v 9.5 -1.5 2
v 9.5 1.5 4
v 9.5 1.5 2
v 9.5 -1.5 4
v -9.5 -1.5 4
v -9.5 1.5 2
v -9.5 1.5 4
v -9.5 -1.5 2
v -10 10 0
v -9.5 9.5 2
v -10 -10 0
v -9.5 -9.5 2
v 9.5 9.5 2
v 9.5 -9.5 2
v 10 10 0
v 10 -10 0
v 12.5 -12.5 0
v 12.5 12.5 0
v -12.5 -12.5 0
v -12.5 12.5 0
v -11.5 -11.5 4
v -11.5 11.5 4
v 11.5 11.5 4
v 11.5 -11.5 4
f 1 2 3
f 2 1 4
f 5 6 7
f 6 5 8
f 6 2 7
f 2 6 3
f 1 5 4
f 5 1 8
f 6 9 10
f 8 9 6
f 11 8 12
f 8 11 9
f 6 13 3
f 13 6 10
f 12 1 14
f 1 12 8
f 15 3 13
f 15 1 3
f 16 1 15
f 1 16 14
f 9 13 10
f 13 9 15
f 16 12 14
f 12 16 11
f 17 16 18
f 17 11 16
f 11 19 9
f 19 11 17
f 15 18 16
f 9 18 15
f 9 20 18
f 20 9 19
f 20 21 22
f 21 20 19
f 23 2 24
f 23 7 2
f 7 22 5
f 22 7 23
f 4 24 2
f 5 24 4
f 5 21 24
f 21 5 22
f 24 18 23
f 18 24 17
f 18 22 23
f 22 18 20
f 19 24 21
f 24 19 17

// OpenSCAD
//Wargaming base
//Thomas Garaside 2023 

$fn=100;
//circle or square 
square=true;


//config vars 
height=4; 
bevelOffset=1;
wallThick=2;
//round only 
diameter=32;
//make an oval base 
transform=0;
//square /rect only 
length=25;
width=25;

//make a slotta base 
slot=true;
slotWidth=3; 
slotOfset=6; //space from edge to slot *2 it was not


// base adaptor
adaptorRound=false;
adaptorSquare=false;
squareSize=20; 
adaptorOffset=2;

//add magnet 
magnetCut=false;
magnetRadius=5;
magHeight=3.5;
//base hollow for magnets 
baseHollow=true;
// add corner magnets ?? 

//calculated vars (do not change)
majorRad=diameter/2;
adaptorRad=squareSize/2;

difference(){
union(){ 
    if(!square){
        resize(newsize=[transform,0,0]){
        cylinder(h=height,r1=majorRad,r2=majorRad-1,center=true);
        }
    }
    else{
    lenVal=length/2; 
    widthVal=width/2;
    topLenVal = lenVal - bevelOffset;
    topWidthVal = widthVal - bevelOffset;
    
        //cube([length,width,height],center=true);
        polyhedron([[lenVal,widthVal,0], [-lenVal,widthVal,0],[-lenVal,-widthVal,0],[lenVal,-widthVal,0],
                    [topLenVal,topWidthVal,height],
                    [-topLenVal,topWidthVal,height],[-topLenVal,-topWidthVal,height],[topLenVal,-topWidthVal,height]
                   ],[
                   [0,1,2,3],  // bottom
                   [4,5,1,0],  // front
                   [7,6,5,4],// top
                   [5,6,2,1],  // right
                   [6,7,3,2],  // back
                   [7,4,0,3]] // left]
        );
      
    }
    
     
}
union(){
    if(slot){
    if(!square){
       
            cube([diameter-slotOfset,slotWidth,height+5],center=true);
    }
    else{
             cube([width-slotOfset,slotWidth,height+5],center=true);
    }
    }
    if(adaptorRound){
    translate([0,0,adaptorOffset]){
        cube([squareSize,squareSize,height+1],center=true);
       
        }
      
    }
    if(adaptorSquare){
    translate([0,0,adaptorOffset]){
       cylinder(h=height,r=adaptorRad,center=true);
       
        }
      
    }
    
    if(magnetCut){
        cylinder(h=magHeight,r=magnetRadius, center=true );
    }
    if(baseHollow){
        if(!square){
            translate([0,0,-wallThick]){
                resize(newsize=[transform,0,0]){
                    cylinder(h=height,r1=majorRad,r2=majorRad-wallThick,center=true);;
                }
            }
        }
        else{
        translate([0,0,-wallThick]){
         
            lenVal=length/2-wallThick; 
    widthVal=width/2-wallThick;
    topLenVal = lenVal - bevelOffset;
    topWidthVal = widthVal - bevelOffset;
    
        //cube([length,width,height],center=true);
        polyhedron([[lenVal,widthVal,0], [-lenVal,widthVal,0],[-lenVal,-widthVal,0],[lenVal,-widthVal,0],
                    [topLenVal,topWidthVal,height],
                    [-topLenVal,topWidthVal,height],[-topLenVal,-topWidthVal,height],[topLenVal,-topWidthVal,height]
                   ],[
                   [0,1,2,3],  // bottom
                   [4,5,1,0],  // front
                   [7,6,5,4],// top
                   [5,6,2,1],  // right
                   [6,7,3,2],  // back
                   [7,4,0,3]] // left]
        );
      
        
        }}
    
    }

}

}
